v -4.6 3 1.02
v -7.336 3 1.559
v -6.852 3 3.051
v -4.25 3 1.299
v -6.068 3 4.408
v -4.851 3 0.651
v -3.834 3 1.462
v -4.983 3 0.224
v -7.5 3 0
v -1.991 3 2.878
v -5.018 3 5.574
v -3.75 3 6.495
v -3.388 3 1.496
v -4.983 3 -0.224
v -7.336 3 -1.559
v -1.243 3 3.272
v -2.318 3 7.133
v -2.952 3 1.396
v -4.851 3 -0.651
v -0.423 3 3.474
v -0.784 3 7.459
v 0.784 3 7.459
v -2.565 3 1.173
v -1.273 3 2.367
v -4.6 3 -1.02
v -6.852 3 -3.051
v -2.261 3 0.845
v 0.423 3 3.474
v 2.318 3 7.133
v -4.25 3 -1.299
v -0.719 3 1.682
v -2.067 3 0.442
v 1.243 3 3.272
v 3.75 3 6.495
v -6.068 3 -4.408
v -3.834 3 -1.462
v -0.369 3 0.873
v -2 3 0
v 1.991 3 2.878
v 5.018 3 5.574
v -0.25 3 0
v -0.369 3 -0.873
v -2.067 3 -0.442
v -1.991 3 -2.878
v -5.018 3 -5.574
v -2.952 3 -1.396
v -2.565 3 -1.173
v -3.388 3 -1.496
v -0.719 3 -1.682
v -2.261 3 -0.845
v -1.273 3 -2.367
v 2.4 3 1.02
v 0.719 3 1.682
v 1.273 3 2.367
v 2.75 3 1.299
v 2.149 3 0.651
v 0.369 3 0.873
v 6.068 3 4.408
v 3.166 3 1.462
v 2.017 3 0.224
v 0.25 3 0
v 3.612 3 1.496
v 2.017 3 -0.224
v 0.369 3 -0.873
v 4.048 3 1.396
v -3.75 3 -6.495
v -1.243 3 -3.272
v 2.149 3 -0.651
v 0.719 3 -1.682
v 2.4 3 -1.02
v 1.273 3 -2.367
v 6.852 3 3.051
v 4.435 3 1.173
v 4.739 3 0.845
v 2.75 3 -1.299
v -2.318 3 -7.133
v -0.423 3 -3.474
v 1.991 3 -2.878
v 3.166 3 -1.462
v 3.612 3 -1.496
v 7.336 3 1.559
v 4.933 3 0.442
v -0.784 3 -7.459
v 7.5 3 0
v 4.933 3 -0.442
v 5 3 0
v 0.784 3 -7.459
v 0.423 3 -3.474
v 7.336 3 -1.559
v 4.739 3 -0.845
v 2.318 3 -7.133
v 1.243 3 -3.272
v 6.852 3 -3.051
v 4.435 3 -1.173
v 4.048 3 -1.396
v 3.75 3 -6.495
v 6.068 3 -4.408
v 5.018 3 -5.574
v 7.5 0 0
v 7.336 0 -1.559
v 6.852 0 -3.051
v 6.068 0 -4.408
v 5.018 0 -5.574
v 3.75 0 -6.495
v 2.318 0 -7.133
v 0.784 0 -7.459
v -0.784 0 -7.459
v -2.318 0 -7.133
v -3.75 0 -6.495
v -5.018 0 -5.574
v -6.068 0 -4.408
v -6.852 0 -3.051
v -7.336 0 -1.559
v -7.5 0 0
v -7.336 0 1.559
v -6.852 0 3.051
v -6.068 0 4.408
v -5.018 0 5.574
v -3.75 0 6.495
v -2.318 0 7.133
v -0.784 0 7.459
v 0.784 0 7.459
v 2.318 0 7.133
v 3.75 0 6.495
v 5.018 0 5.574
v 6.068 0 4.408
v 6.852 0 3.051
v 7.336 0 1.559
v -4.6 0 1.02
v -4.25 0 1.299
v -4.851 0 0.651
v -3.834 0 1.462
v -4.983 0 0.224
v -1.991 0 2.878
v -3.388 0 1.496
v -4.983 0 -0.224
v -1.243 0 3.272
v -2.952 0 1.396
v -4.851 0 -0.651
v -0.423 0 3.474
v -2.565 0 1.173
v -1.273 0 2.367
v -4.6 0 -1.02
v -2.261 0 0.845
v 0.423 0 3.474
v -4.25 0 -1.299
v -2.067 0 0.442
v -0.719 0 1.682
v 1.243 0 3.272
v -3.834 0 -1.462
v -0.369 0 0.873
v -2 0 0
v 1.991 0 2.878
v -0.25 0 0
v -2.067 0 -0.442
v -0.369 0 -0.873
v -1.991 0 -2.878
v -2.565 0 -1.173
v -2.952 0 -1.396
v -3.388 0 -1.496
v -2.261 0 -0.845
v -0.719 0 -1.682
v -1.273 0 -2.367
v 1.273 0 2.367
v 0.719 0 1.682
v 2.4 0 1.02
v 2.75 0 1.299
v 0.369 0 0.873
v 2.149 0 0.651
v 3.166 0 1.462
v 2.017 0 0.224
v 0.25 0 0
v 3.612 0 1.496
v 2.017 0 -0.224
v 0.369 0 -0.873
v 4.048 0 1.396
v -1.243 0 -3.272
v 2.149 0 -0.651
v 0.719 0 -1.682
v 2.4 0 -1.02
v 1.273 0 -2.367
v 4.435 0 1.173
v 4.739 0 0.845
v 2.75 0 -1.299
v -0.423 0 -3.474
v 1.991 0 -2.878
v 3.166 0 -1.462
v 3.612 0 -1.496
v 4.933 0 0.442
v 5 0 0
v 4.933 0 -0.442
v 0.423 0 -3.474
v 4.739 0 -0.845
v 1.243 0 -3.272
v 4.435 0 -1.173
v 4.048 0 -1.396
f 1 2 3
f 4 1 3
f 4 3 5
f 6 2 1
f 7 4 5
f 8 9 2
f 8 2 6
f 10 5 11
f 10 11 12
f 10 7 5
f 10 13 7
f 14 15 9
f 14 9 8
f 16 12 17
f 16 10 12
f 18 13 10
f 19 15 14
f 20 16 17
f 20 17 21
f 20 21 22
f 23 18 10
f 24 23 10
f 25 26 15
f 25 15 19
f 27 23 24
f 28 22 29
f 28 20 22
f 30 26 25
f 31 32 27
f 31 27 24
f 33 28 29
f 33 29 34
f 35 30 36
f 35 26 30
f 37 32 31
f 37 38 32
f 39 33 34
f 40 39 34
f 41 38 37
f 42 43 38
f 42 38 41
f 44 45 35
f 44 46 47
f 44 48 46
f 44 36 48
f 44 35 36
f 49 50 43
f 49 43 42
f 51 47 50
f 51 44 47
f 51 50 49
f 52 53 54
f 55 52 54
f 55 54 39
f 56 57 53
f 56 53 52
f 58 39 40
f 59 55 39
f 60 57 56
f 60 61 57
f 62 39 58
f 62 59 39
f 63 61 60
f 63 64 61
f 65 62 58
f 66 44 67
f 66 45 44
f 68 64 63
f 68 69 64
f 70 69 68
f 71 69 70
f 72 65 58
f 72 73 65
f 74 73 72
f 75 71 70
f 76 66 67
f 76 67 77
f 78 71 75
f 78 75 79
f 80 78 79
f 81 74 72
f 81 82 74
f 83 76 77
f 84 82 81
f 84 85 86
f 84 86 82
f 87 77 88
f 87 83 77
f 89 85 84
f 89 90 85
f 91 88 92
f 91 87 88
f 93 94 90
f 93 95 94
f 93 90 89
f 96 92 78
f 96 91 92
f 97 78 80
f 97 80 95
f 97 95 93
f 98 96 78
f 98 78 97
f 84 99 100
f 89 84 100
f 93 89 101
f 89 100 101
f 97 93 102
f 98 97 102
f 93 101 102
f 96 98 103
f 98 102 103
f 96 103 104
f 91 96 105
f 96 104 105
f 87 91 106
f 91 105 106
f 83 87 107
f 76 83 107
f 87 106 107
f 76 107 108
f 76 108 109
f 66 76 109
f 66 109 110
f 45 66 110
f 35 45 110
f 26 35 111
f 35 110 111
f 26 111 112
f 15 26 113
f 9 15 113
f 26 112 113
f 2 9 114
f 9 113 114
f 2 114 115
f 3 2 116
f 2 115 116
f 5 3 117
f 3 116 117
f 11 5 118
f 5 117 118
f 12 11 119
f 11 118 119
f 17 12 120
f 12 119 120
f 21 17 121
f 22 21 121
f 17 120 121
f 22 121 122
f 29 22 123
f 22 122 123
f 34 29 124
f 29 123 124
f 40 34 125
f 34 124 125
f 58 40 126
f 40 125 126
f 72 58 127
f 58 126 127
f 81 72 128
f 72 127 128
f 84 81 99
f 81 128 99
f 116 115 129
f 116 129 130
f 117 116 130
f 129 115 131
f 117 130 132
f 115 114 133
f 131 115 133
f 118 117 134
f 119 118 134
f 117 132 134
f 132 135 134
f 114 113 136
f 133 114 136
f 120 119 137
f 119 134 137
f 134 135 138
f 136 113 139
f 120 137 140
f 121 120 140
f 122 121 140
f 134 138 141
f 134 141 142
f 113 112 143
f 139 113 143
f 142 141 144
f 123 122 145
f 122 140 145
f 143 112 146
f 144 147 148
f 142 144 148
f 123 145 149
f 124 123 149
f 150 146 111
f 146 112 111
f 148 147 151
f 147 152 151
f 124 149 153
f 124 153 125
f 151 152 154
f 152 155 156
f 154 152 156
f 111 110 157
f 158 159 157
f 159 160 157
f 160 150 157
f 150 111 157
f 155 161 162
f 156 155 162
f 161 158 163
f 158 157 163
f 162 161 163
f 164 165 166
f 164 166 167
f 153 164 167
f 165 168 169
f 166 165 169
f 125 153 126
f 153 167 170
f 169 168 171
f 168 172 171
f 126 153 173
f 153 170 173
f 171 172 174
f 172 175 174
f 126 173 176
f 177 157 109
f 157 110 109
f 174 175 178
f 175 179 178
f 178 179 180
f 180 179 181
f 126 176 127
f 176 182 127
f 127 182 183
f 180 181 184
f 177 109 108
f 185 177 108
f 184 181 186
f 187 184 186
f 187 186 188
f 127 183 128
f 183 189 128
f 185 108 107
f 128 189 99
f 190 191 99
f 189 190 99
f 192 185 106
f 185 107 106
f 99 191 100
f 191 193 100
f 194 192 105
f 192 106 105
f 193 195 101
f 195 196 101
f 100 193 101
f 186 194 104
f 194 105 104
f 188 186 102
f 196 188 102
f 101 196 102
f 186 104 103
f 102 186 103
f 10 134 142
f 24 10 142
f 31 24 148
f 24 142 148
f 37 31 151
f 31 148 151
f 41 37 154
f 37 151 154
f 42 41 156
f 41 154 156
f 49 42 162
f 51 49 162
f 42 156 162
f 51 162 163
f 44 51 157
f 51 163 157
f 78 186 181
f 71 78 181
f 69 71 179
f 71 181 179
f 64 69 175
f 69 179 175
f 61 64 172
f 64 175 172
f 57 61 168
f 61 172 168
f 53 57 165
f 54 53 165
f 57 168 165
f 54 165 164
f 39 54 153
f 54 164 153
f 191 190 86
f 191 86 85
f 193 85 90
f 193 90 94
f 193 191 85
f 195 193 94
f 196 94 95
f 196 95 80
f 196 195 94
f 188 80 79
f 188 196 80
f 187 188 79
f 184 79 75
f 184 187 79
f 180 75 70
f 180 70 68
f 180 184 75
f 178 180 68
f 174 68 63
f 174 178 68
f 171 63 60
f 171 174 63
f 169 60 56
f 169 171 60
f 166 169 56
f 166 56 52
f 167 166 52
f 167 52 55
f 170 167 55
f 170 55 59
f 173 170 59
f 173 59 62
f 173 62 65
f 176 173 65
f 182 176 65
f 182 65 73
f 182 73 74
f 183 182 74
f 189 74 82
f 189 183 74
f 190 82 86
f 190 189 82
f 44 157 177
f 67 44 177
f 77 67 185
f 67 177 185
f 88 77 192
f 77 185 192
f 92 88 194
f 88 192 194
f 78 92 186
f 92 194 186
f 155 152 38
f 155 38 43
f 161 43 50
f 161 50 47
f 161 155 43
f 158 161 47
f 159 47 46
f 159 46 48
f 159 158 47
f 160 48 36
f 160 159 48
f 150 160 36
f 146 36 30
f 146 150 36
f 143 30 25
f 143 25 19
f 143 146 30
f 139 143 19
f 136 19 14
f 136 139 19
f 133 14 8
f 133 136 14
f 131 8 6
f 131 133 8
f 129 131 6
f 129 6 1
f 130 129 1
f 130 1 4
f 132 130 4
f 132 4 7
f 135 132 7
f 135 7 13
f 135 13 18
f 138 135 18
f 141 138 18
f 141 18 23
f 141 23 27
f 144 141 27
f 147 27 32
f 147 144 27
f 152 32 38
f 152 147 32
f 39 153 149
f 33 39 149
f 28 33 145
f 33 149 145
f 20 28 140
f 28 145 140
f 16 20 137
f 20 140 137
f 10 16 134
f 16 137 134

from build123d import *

# Parameters (mm, degrees)
ESQUISSE1_R        = 7.5
ESQUISSE1_R_2      = 1.5
BOSS_EXTRU_1_DEPTH = 3


with BuildPart() as part:
    # Esquisse1 → Boss.-Extru.1 (new body)
    with BuildSketch(Plane(origin=(0, 0, 0), x_dir=(1, 0, 0), z_dir=(0, 1, 0))):
        Circle(ESQUISSE1_R)
        with Locations((-3.5, 0)):
            Circle(ESQUISSE1_R_2, mode=Mode.SUBTRACT)
        with Locations((3.5, 0)):
            Circle(ESQUISSE1_R_2, mode=Mode.SUBTRACT)
        with BuildLine():
            ThreePointArc((1.991071429, 2.878477821), (0.25, 0), (1.991071429, -2.878477821))
            ThreePointArc((1.991071429, -2.878477821), (0, -3.5), (-1.991071429, -2.878477821))
            ThreePointArc((-1.991071429, -2.878477821), (-0.25, 0), (-1.991071429, 2.878477821))
            ThreePointArc((-1.991071429, 2.878477821), (0, 3.5), (1.991071429, 2.878477821))
        make_face(mode=Mode.SUBTRACT)
    extrude(amount=BOSS_EXTRU_1_DEPTH)


solid = part.part
